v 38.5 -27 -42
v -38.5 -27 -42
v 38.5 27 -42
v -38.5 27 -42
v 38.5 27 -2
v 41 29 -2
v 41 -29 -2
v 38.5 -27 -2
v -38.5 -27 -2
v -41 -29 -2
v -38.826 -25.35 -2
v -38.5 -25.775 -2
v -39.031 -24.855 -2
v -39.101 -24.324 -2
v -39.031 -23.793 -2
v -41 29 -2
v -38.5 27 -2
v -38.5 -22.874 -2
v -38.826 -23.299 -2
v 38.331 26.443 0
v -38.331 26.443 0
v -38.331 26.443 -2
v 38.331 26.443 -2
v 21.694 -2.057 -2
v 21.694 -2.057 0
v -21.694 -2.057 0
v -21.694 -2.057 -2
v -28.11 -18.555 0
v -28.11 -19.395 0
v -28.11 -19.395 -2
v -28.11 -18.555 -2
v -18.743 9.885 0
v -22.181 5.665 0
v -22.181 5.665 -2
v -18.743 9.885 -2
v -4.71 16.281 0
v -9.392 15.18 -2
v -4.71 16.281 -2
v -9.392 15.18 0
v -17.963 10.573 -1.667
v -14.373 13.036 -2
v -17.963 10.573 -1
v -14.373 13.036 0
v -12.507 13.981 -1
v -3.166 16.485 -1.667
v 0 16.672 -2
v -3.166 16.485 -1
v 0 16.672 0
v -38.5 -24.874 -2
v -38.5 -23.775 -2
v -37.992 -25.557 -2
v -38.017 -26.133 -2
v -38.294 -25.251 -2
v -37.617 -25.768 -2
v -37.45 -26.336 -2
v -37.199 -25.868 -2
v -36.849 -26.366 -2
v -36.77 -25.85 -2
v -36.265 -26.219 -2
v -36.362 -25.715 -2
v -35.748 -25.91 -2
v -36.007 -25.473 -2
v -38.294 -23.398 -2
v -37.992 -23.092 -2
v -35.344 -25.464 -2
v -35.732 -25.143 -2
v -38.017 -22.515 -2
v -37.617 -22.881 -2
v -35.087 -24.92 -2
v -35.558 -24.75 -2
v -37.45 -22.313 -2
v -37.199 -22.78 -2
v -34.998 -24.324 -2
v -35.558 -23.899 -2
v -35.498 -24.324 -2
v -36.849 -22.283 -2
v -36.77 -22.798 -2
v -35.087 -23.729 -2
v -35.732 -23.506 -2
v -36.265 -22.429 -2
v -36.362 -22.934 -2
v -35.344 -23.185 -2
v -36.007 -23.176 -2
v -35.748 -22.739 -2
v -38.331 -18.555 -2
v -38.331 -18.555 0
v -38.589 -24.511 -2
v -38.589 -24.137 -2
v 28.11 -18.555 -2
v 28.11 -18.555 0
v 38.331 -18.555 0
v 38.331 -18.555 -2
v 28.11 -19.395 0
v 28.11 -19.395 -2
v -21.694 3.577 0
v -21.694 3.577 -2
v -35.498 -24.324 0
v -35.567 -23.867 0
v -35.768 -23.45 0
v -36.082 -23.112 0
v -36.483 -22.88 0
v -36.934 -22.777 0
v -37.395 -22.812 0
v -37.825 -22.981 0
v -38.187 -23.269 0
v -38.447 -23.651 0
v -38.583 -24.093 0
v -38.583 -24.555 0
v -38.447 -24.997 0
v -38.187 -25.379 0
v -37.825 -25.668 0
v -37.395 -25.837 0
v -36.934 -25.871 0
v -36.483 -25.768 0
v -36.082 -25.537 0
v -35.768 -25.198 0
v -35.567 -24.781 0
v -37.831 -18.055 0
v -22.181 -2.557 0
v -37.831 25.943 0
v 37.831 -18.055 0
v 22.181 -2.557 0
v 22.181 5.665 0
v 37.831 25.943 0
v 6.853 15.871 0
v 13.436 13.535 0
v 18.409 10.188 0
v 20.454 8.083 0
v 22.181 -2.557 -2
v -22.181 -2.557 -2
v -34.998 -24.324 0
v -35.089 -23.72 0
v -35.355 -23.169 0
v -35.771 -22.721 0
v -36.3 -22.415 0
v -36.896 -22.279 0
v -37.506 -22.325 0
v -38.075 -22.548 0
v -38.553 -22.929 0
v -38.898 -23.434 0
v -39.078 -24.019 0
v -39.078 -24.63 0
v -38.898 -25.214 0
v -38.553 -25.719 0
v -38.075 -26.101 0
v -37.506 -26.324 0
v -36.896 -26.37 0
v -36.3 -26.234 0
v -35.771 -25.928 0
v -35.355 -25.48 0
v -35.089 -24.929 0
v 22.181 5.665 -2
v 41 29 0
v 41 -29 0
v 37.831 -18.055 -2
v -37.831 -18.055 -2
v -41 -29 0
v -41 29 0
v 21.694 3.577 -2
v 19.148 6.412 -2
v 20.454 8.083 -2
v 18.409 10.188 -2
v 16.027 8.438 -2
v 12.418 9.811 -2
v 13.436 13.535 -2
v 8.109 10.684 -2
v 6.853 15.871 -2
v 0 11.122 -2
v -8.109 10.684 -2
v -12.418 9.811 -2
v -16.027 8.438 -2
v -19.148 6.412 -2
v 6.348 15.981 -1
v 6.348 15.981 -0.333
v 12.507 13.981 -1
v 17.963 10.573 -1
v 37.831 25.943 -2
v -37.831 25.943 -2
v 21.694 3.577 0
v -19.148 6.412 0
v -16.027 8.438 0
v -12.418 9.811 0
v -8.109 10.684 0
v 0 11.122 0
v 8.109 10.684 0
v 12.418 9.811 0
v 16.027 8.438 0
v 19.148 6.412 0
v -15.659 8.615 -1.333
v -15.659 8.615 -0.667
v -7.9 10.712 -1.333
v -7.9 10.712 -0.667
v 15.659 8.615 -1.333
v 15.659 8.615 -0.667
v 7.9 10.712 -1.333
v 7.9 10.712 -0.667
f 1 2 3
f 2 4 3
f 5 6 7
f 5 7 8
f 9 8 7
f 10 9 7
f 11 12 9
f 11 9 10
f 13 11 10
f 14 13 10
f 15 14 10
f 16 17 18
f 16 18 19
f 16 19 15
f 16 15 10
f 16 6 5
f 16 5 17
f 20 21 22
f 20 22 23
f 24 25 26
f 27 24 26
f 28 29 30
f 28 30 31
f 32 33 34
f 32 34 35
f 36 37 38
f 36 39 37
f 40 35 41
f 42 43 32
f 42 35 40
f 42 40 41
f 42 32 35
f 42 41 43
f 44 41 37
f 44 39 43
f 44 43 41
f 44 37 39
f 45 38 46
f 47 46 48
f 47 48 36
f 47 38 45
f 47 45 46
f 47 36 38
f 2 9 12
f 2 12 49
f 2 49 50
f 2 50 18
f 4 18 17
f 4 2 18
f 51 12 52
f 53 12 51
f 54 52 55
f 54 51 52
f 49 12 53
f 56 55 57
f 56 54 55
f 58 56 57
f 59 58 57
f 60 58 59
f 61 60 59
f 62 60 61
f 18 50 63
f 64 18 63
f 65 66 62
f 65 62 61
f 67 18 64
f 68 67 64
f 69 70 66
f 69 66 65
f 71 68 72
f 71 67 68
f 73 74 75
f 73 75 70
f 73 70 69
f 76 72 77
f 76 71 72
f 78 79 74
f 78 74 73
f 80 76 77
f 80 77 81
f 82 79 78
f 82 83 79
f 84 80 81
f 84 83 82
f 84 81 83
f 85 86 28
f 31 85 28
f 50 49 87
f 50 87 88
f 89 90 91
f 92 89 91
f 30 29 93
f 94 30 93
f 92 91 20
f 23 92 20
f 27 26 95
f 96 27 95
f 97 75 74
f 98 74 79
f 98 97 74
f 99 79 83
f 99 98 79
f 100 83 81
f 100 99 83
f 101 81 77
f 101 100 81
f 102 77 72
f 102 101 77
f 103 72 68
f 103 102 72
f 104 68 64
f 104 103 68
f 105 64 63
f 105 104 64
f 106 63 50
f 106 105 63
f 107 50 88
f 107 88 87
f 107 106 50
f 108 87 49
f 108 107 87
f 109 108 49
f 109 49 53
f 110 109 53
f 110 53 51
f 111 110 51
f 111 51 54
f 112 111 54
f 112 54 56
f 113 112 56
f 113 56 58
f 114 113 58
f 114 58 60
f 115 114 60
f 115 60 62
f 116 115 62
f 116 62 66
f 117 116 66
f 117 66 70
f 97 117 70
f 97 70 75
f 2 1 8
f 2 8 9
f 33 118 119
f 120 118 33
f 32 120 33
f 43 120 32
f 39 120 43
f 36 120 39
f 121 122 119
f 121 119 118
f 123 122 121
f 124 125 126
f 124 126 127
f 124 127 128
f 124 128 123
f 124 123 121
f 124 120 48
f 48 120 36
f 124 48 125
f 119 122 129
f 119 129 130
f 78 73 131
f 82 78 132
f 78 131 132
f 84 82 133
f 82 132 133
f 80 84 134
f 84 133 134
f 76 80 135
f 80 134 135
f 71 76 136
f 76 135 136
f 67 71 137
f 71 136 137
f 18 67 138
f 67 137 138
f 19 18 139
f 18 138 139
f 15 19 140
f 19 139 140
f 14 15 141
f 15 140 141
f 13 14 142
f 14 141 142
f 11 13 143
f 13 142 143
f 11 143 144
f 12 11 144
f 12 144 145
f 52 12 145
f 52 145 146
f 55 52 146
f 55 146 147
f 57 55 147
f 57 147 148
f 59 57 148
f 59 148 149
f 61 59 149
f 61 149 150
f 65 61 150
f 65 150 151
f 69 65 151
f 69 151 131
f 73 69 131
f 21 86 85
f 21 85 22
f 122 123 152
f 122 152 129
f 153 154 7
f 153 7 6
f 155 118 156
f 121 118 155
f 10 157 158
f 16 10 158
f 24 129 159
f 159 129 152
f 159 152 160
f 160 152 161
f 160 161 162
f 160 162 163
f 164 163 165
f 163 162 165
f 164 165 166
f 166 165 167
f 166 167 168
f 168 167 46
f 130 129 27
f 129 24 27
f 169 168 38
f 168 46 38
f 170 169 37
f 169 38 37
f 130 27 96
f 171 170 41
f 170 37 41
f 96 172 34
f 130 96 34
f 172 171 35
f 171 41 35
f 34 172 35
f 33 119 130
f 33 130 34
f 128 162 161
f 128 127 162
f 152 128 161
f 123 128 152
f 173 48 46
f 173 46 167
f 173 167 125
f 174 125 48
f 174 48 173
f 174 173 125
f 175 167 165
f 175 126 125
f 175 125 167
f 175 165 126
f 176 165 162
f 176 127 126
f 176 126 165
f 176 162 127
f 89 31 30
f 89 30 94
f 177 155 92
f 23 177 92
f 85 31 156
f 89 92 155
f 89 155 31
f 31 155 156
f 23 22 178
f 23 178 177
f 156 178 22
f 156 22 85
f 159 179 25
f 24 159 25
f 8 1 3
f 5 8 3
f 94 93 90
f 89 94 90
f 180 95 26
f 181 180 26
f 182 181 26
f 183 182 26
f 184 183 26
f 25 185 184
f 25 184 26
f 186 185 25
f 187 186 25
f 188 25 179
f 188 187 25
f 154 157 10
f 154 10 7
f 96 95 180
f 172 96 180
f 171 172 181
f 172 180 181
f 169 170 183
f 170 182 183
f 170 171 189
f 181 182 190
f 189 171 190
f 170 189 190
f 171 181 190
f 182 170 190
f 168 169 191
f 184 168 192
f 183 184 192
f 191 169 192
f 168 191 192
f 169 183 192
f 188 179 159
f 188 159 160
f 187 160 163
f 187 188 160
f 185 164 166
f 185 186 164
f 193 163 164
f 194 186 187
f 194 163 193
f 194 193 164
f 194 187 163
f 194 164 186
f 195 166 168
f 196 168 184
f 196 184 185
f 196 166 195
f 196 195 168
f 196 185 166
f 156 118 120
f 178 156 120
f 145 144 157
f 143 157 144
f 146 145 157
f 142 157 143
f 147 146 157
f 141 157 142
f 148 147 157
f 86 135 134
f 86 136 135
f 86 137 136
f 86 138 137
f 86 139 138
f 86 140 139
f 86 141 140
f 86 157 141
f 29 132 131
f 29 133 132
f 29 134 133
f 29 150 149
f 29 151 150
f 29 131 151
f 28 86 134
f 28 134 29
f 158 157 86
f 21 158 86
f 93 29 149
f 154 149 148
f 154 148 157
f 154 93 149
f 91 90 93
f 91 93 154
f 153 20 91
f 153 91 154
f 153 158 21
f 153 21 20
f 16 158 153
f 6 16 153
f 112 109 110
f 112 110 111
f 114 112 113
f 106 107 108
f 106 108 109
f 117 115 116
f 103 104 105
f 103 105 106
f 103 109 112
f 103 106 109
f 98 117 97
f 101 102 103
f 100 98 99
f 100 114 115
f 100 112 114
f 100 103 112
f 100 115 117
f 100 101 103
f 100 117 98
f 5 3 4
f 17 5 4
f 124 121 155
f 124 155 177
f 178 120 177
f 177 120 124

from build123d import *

# Parameters (mm, degrees)
SKETCH_1_W           = 82
SKETCH_1_H           = 58
EXTRUDE_1_DEPTH      = 42
SKETCH_2_OUTSIDE_W   = 105.774
SKETCH_2_OUTSIDE_H   = 81.774
SKETCH_2_OUTSIDE_W_2 = 77
SKETCH_2_OUTSIDE_H_2 = 54
CUT_EXTRUDE_1_DEPTH  = 40
SKETCH_3_R           = 2.051183763
SKETCH_3_R_2         = 1.551183763
SKETCH_3_W           = 76.662993142
SKETCH_3_H           = 44.9978438
SKETCH_3_W_2         = 75.662993142
SKETCH_3_H_2         = 43.9978438
CUT_EXTRUDE_2_DEPTH  = 2
SKETCH_5_W           = 56.22095986
SKETCH_5_H           = 0.839970392
CUT_EXTRUDE_3_DEPTH  = 2


with BuildPart() as part:
    # 草图1 → 凸台-拉伸1 (new body)
    with BuildSketch(Plane.XY):
        Rectangle(SKETCH_1_W, SKETCH_1_H)
    extrude(amount=-EXTRUDE_1_DEPTH)

    # 草图2 outside → 切除-拉伸1 (cut)
    with BuildSketch(Plane(origin=(0, 0, -42), x_dir=(-1, 0, 0), z_dir=(0, 0, -1))):
        Rectangle(SKETCH_2_OUTSIDE_W, SKETCH_2_OUTSIDE_H)
        Rectangle(SKETCH_2_OUTSIDE_W_2, SKETCH_2_OUTSIDE_H_2, mode=Mode.SUBTRACT)
    extrude(amount=-CUT_EXTRUDE_1_DEPTH, mode=Mode.SUBTRACT)

    # 草图3 → 切除-拉伸2 (cut)
    # profile 1 of 2: a face of its own
    with BuildSketch(Plane.XY):
        with Locations((-37.049506719, -24.324267733)):
            Circle(SKETCH_3_R)
        with Locations((-37.049506719, -24.324267733)):
            Circle(SKETCH_3_R_2, mode=Mode.SUBTRACT)
    # profile 2 of 2: a face of its own
    with BuildSketch(Plane.XY):
        with Locations((0, 3.943608501)):
            Rectangle(SKETCH_3_W, SKETCH_3_H)
        with Locations((0, 3.943608501)):
            Rectangle(SKETCH_3_W_2, SKETCH_3_H_2, mode=Mode.SUBTRACT)
    extrude(amount=-CUT_EXTRUDE_2_DEPTH, mode=Mode.SUBTRACT)

    # 草图5 → 切除-拉伸3 (cut)
    # profile 1 of 2: a face of its own
    with BuildSketch(Plane.XY):
        with Locations((0, -18.975298595)):
            Rectangle(SKETCH_5_W, SKETCH_5_H)
    # profile 2 of 2: a face of its own
    with BuildSketch(Plane.XY):
        with BuildLine():
            Line((22.181492686, -2.55676808), (-22.181492686, -2.55676808))
            Line((-22.181492686, -2.55676808), (-22.181492686, 5.66529789))
            add(Edge.make_bspline(
                [(-22.181492686, 5.66529789), (-21.613171528, 6.595019079), (-20.324411635, 8.382514153), (-17.243691235, 11.385794253), (-12.622221003, 14.216373785), (-7.423291418, 15.868320573), (-3.158321809, 16.537625375), (-1.057172799, 16.660943148), (0, 16.672230501)],
                knots=[-0.005481994, -0.005481994, -0.005481994, -0.005481994, 0.120230411, 0.245942817, 0.497367628, 0.748792439, 0.874504845, 1.00021725, 1.00021725, 1.00021725, 1.00021725], degree=3))
            add(Edge.make_bspline(
                [(0, 16.672230501), (1.057172799, 16.660943148), (3.158321809, 16.537625375), (7.423291418, 15.868320573), (12.622221003, 14.216373785), (17.243691235, 11.385794253), (20.324411635, 8.382514153), (21.613171528, 6.595019079), (22.181492686, 5.66529789)],
                knots=[-0.005481994, -0.005481994, -0.005481994, -0.005481994, 0.120230411, 0.245942817, 0.497367628, 0.748792439, 0.874504845, 1.00021725, 1.00021725, 1.00021725, 1.00021725], degree=3))
            Line((22.181492686, 5.66529789), (22.181492686, -2.55676808))
        make_face()
        with BuildLine():
            Line((21.693569538, -2.05676808), (-21.693569538, -2.05676808))
            Line((-21.693569538, -2.05676808), (-21.693569538, 3.576865713))
            add(Edge.make_bspline(
                [(-21.693569538, 3.576865713), (-17.048272024, 10.504797519), (-7.443342261, 11.136498571), (0, 11.122264619)],
                knots=[0, 0, 0, 0, 1, 1, 1, 1], degree=3))
            add(Edge.make_bspline(
                [(21.693569538, 3.576865713), (17.048272024, 10.504797519), (7.443342261, 11.136498571), (0, 11.122264619)],
                knots=[0, 0, 0, 0, 1, 1, 1, 1], degree=3))
            Line((21.693569538, 3.576865713), (21.693569538, -2.05676808))
        make_face(mode=Mode.SUBTRACT)
    extrude(amount=-CUT_EXTRUDE_3_DEPTH, mode=Mode.SUBTRACT)


solid = part.part
